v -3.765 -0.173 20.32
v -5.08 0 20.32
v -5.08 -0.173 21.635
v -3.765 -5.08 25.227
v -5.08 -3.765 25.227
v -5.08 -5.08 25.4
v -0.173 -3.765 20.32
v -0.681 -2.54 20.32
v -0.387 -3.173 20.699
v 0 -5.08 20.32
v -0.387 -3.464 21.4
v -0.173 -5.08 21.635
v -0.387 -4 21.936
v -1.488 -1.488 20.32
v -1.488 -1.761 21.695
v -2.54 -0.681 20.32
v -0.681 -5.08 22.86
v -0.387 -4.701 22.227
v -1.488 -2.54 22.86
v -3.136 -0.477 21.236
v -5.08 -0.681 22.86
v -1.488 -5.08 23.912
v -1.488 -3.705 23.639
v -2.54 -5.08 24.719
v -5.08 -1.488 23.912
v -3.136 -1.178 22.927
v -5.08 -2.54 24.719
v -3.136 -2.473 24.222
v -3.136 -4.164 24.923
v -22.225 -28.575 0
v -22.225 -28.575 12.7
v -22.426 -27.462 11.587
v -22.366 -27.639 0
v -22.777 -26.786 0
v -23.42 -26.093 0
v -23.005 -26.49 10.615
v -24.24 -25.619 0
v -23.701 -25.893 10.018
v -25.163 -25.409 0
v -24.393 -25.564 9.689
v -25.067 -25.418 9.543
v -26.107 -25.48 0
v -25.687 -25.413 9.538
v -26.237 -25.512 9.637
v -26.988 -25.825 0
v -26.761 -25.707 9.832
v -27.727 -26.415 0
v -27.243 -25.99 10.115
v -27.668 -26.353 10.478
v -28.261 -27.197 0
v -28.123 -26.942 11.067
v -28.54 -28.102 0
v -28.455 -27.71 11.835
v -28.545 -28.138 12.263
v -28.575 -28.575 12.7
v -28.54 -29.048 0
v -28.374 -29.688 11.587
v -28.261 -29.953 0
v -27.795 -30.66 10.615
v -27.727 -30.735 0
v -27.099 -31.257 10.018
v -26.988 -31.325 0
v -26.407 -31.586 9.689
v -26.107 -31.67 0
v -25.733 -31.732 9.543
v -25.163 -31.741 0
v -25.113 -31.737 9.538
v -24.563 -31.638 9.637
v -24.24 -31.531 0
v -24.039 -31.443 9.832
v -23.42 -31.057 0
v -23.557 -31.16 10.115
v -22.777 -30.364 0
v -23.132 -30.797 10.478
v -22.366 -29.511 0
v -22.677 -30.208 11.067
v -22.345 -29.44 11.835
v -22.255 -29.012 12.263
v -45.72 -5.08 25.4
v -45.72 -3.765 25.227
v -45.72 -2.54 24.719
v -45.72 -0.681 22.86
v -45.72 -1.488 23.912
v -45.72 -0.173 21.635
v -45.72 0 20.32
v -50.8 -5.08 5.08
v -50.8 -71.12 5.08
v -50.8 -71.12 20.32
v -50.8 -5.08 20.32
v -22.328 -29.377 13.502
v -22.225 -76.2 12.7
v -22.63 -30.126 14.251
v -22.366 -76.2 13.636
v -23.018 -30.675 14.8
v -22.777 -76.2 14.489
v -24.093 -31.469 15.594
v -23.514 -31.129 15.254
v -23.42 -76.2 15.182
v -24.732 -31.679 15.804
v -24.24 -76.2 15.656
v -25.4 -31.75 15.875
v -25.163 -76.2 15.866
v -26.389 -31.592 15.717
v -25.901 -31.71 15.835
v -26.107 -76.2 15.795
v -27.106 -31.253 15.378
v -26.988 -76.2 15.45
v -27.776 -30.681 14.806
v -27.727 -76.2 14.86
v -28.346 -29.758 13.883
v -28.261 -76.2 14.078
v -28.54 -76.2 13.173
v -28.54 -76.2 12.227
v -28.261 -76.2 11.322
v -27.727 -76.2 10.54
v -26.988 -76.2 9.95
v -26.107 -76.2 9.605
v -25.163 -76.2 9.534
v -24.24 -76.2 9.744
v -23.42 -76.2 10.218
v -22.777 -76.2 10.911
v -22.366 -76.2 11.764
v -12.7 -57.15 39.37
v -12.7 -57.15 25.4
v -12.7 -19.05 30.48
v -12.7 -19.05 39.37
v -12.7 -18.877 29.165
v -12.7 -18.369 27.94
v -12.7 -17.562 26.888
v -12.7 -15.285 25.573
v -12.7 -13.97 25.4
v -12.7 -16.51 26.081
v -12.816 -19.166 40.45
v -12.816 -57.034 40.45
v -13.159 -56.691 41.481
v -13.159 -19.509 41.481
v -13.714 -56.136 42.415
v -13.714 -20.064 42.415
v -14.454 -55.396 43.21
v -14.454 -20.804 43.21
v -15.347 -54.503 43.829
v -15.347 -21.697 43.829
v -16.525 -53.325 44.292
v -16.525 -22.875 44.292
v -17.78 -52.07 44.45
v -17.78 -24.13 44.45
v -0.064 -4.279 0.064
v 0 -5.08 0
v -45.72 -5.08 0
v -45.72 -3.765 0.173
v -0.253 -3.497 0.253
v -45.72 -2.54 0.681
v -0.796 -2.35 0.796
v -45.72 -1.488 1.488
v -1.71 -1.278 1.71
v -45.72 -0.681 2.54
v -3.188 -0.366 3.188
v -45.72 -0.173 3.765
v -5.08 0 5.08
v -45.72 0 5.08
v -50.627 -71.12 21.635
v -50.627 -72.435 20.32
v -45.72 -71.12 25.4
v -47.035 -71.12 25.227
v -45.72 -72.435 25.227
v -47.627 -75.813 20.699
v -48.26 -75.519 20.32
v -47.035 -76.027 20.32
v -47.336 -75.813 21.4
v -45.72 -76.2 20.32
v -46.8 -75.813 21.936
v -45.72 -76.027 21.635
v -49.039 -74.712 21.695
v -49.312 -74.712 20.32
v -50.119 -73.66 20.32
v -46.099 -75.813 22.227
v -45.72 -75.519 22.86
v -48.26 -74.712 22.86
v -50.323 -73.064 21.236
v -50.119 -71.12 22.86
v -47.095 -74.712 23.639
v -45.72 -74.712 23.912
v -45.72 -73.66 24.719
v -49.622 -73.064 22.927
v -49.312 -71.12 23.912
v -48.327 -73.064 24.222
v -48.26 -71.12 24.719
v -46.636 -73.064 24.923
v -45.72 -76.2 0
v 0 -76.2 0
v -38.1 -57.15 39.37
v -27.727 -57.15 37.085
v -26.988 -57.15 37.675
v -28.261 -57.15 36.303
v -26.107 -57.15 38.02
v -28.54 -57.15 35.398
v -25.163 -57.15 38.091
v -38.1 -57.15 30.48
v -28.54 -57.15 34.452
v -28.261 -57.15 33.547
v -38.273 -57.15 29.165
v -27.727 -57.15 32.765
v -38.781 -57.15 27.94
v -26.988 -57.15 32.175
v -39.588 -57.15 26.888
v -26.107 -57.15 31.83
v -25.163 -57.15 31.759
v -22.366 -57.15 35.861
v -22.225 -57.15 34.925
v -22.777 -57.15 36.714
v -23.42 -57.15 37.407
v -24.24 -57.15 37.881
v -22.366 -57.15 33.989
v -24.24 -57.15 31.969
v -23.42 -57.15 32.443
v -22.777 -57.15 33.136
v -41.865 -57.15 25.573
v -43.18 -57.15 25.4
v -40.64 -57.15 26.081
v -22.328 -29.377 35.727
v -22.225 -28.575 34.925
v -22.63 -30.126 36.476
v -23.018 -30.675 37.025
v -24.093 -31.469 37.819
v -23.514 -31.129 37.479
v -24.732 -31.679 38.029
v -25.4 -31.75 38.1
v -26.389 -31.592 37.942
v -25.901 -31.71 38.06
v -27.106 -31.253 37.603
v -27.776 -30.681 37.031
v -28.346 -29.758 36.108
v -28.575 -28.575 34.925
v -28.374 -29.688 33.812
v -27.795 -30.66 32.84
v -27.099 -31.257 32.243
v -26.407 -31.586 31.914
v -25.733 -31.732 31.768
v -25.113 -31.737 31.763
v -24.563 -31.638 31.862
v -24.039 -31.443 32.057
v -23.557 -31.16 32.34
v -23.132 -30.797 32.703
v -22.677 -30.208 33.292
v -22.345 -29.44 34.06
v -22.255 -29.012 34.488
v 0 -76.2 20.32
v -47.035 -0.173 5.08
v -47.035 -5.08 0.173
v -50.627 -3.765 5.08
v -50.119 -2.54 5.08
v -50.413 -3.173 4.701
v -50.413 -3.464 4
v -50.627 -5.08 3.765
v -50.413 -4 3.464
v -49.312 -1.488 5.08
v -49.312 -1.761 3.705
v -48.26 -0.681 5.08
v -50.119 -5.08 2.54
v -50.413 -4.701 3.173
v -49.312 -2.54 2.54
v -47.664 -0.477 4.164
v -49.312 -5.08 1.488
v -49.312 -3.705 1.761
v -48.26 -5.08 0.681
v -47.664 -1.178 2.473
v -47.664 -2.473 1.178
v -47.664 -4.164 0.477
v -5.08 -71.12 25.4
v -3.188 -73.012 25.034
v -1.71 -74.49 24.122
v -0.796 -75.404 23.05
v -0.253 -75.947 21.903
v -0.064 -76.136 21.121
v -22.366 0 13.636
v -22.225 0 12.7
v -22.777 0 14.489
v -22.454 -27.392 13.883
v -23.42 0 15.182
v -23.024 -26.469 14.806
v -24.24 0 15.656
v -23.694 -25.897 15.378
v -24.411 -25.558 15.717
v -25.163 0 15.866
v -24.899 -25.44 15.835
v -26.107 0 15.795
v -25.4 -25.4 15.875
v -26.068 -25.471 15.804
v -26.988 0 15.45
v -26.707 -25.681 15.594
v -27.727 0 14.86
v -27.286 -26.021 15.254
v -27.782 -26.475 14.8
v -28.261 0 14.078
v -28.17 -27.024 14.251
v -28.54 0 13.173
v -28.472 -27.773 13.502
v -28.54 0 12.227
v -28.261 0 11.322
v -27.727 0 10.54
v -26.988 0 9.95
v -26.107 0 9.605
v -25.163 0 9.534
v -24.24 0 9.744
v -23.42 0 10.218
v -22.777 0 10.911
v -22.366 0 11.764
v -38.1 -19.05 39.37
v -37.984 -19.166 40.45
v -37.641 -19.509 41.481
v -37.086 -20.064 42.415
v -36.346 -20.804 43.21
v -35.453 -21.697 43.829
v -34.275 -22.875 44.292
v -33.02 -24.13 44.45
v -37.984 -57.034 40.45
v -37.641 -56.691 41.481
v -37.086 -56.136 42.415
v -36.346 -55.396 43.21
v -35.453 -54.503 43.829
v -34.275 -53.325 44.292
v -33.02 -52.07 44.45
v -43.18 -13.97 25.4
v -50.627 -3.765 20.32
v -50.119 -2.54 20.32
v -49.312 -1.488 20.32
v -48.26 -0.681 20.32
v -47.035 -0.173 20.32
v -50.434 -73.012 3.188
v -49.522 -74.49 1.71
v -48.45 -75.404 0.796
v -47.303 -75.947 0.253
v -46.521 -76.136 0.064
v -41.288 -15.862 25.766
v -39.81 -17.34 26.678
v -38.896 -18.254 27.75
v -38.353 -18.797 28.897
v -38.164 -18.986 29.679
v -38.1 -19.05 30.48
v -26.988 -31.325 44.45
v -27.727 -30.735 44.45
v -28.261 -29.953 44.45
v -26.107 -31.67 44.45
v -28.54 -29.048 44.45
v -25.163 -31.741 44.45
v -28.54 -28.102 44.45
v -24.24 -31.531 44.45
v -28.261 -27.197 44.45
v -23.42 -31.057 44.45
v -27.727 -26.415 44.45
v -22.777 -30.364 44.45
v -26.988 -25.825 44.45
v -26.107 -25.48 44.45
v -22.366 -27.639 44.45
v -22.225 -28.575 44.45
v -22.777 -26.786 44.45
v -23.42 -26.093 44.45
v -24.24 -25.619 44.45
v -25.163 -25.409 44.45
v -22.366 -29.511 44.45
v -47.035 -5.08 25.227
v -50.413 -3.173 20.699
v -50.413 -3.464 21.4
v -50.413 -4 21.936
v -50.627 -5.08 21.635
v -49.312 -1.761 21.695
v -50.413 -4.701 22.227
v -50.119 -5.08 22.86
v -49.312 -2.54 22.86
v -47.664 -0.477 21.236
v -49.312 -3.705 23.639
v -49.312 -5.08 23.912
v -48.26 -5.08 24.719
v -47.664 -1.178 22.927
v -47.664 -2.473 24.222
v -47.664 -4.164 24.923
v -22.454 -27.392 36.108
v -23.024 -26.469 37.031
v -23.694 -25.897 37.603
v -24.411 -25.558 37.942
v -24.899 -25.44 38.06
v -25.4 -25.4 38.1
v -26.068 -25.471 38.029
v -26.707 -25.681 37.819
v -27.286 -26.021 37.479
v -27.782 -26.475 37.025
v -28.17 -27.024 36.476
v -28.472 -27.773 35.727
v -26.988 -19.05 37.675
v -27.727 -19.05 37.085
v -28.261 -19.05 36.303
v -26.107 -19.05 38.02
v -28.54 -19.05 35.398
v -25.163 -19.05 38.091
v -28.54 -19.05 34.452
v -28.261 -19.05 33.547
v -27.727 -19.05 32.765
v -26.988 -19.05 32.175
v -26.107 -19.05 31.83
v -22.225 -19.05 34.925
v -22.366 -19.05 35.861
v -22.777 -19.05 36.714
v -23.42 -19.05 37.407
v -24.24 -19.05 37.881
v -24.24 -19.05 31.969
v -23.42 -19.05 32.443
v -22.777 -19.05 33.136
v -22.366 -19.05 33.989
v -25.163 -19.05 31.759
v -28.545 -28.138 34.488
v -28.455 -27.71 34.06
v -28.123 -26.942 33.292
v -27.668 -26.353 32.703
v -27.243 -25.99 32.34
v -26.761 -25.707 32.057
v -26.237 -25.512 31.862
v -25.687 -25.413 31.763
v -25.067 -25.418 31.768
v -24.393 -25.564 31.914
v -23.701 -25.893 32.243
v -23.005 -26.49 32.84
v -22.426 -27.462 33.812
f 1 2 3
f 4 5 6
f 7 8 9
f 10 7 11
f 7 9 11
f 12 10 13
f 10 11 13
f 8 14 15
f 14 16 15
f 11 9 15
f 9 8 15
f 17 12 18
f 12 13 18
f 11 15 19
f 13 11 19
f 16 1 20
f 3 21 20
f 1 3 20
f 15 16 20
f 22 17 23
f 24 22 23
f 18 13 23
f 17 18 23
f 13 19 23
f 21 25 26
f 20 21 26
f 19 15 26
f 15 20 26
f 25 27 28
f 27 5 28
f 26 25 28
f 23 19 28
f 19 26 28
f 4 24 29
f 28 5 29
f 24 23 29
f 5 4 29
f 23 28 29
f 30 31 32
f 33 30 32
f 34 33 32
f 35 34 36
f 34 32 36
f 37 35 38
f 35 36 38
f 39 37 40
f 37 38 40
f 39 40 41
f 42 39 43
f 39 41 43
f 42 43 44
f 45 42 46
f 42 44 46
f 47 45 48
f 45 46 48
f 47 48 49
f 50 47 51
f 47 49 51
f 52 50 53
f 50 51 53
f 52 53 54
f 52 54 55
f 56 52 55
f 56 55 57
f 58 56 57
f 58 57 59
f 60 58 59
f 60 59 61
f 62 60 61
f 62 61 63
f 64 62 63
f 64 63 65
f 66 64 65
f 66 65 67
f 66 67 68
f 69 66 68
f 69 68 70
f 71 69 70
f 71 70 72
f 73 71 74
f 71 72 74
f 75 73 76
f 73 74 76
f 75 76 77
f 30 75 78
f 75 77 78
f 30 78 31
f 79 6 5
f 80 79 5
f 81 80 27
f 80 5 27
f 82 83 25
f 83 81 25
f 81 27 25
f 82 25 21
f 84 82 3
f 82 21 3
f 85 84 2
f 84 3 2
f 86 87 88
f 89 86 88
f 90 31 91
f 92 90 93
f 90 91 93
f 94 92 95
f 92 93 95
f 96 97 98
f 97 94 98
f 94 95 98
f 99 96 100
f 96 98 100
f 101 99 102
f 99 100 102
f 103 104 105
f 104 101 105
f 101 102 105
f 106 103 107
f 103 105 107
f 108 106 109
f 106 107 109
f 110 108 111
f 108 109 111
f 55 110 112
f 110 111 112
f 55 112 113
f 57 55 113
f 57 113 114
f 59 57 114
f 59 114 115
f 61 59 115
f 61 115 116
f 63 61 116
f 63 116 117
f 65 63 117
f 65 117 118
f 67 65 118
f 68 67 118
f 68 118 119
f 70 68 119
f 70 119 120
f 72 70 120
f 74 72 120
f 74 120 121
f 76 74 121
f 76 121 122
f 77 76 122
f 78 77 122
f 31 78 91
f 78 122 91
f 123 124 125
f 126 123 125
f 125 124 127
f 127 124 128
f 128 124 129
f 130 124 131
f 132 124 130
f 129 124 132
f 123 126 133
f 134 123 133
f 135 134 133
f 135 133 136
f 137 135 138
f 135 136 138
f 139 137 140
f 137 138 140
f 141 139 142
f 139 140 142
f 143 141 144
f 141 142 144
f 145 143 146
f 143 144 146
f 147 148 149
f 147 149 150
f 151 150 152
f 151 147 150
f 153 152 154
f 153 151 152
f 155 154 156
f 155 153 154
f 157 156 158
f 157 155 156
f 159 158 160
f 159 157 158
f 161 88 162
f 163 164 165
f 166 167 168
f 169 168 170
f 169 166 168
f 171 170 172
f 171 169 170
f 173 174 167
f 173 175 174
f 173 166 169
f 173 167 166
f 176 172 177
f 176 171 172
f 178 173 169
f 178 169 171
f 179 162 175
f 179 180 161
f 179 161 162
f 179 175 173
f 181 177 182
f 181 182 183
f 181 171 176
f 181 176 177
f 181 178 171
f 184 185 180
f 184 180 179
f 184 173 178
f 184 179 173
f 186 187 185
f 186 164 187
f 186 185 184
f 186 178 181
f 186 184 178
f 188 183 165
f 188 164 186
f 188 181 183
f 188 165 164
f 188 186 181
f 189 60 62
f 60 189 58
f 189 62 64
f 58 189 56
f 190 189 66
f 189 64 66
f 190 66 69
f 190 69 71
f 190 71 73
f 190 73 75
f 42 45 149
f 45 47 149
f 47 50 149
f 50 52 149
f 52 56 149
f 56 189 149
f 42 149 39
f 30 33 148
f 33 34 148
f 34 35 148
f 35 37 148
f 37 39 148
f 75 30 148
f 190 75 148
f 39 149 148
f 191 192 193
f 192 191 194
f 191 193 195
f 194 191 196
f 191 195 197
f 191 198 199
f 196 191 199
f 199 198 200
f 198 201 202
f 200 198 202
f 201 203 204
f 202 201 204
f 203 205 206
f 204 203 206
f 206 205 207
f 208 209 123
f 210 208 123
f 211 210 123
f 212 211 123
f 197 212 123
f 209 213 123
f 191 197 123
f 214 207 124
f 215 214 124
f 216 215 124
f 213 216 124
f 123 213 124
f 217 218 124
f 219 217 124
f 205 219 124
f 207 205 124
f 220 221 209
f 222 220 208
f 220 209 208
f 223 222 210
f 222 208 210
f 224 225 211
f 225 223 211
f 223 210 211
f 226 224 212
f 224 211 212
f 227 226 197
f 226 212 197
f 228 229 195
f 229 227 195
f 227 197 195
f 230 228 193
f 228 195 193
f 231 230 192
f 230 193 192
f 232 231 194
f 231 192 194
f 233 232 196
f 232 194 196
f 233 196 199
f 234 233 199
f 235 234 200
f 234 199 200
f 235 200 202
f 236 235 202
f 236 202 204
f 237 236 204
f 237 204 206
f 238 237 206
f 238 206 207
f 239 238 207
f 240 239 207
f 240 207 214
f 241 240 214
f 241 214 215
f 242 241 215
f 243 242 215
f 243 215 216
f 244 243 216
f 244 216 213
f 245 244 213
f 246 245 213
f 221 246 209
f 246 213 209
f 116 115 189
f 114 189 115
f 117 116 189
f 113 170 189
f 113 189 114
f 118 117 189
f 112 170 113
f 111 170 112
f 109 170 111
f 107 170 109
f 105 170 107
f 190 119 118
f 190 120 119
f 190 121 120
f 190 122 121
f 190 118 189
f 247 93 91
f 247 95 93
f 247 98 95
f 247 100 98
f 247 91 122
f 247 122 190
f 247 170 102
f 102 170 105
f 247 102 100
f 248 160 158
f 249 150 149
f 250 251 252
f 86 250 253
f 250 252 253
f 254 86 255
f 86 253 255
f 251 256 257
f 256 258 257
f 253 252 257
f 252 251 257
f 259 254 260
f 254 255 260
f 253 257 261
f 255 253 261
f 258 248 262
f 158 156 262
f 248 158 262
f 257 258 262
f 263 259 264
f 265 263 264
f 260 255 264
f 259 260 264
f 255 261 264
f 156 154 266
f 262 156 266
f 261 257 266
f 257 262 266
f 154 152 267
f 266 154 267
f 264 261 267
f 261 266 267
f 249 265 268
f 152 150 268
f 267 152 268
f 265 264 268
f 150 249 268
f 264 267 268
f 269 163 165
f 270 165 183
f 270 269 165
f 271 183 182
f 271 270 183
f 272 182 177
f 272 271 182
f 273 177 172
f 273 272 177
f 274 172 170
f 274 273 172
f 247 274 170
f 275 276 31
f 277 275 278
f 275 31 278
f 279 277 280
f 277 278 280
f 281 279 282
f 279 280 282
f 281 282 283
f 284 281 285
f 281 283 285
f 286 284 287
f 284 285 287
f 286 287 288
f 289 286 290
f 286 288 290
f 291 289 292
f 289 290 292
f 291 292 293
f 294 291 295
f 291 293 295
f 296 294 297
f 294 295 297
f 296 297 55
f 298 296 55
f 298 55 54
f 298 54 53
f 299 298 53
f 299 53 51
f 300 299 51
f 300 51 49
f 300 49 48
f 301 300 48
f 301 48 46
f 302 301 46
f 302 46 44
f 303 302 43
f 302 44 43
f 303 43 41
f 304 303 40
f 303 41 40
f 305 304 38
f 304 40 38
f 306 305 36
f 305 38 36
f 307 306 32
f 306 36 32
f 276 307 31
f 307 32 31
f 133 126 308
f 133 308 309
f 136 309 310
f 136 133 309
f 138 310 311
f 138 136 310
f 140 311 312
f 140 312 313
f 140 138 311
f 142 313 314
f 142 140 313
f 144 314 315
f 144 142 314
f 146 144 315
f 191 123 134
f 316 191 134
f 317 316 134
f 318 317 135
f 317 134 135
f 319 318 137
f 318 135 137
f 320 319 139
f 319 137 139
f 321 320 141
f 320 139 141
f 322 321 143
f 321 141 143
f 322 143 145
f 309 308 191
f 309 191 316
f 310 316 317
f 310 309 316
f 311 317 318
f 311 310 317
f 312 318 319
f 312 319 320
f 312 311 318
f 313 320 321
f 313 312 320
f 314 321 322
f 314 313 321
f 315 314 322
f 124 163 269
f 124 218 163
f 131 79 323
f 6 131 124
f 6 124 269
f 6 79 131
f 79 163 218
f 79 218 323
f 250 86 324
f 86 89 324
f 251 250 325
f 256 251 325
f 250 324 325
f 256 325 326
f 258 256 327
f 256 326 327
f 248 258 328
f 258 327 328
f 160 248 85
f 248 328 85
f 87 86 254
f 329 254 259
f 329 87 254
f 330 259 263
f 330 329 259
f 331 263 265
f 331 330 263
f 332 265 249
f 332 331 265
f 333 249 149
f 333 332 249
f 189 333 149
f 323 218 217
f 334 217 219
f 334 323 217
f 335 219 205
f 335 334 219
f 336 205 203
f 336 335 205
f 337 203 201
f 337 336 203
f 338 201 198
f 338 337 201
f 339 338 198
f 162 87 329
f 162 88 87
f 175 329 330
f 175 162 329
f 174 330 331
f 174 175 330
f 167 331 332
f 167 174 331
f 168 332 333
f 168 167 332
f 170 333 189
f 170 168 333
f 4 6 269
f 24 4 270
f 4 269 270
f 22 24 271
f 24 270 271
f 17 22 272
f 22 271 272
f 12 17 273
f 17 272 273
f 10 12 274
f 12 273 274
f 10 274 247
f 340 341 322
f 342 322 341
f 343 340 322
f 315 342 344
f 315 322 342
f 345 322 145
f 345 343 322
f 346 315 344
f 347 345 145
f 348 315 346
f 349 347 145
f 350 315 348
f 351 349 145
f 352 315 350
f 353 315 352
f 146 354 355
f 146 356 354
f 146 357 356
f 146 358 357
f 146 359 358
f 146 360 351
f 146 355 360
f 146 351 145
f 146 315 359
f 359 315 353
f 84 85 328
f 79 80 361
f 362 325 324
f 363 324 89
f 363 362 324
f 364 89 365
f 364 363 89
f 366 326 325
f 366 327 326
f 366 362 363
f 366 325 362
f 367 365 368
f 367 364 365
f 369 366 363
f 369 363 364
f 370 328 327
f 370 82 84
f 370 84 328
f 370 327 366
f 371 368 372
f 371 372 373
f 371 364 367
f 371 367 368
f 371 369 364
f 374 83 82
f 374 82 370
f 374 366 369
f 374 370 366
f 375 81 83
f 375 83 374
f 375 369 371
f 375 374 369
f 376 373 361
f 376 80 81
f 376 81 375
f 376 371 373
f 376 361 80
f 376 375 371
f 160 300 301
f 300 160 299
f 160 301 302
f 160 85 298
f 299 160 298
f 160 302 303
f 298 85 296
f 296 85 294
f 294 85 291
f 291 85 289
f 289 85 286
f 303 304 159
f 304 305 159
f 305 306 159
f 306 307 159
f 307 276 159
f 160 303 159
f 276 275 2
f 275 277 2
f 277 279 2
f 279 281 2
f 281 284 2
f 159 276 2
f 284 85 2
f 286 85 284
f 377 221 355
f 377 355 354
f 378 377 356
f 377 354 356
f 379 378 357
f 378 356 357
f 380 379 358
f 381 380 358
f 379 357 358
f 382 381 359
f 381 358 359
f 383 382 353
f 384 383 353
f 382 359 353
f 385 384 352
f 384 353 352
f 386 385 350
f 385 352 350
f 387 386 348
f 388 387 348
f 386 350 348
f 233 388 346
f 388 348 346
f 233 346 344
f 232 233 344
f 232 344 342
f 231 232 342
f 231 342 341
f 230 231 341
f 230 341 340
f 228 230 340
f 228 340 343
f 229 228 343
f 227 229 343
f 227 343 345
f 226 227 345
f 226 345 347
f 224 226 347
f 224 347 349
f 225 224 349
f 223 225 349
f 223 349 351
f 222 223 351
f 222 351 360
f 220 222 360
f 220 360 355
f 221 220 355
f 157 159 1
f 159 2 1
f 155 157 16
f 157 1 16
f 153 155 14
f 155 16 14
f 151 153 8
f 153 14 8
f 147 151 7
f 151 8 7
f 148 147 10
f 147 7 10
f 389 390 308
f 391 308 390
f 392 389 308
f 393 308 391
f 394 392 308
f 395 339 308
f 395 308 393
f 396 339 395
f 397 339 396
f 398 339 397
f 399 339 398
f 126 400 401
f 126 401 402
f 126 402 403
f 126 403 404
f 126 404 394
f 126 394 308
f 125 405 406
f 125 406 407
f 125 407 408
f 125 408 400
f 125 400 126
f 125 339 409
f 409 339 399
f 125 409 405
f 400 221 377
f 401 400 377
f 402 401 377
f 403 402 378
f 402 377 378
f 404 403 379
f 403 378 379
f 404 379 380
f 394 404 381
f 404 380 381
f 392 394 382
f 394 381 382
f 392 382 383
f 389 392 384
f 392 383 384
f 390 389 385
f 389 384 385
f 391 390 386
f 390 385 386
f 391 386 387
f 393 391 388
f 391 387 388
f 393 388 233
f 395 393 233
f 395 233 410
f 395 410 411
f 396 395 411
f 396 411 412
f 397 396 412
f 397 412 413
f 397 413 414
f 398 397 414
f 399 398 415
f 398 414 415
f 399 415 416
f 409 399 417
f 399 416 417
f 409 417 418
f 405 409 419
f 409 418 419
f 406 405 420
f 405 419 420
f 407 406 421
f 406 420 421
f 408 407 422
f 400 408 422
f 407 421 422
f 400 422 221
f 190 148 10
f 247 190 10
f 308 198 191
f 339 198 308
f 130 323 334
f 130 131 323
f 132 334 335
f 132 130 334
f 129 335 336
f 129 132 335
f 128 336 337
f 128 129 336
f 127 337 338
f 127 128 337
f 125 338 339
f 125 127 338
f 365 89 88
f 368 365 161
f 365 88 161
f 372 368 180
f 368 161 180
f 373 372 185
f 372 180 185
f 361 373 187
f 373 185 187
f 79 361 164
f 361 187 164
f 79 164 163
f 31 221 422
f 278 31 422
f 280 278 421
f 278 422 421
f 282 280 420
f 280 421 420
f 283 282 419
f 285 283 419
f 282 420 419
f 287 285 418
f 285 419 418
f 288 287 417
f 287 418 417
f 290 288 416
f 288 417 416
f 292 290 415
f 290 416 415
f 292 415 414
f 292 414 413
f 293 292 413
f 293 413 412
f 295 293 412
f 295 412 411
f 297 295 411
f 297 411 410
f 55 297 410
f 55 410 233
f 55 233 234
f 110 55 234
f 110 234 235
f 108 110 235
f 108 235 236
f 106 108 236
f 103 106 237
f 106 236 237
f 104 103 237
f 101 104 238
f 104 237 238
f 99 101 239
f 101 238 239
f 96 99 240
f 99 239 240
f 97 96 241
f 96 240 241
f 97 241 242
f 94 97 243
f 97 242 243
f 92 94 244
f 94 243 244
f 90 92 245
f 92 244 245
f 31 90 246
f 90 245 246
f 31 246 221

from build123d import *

# Parameters (mm, degrees)
F0_W     = 50.8
F0_H     = 25.4
F1_DEPTH = 76.2
F2_W     = 25.4
F2_H     = 38.1
F3_DEPTH = 19.05
F4_R     = 3.175
F5_DEPTH = 44.45
F6_R     = 3.175
F7_DEPTH = 76.2
F8_R     = 3.175
F9_DEPTH = 38.1
F10_R    = 5.08


with BuildPart() as f1:
    # F0 (on Front) → F1 (new body)
    with BuildSketch(Plane.XZ):
        with Locations((-25.4, 12.7)):
            Rectangle(F0_W, F0_H)
    extrude(amount=F1_DEPTH)

    # F2 (on face) → F3 (join)
    with BuildSketch(Plane.XY.offset(25.4)):
        with Locations((-25.4, -38.1)):
            Rectangle(F2_W, F2_H)
    extrude(amount=F3_DEPTH)

    # F4 (on face) → F5 (cut)
    with BuildSketch(Plane.XY.offset(44.45)):
        with Locations((-25.4, -28.575)):
            Circle(F4_R)
    extrude(amount=-F5_DEPTH, mode=Mode.SUBTRACT)

    # F6 (on face) → F7 (cut)
    with BuildSketch(Plane.XZ.offset(76.2)):
        with Locations((-25.4, 12.7)):
            Circle(F6_R)
    extrude(amount=-F7_DEPTH, mode=Mode.SUBTRACT)

    # F8 (on face) → F9 (cut)
    with BuildSketch(Plane.XZ.offset(57.15)):
        with Locations((-25.4, 34.925)):
            Circle(F8_R)
    extrude(amount=-F9_DEPTH, mode=Mode.SUBTRACT)

    # F10
    f10_edges = [f1.edges().sort_by_distance(p)[0] for p in [
        (-38.1, -38.1, 44.45),
        (-25.4, -19.05, 44.45),
        (-12.7, -38.1, 44.45),
        (-25.4, -57.15, 44.45),
        (-25.4, -19.05, 25.4),
        (-38.1, -38.1, 25.4),
        (-25.4, 0, 25.4),
        (0, 0, 12.7),
        (-25.4, 0, 0),
        (-50.8, 0, 12.7),
        (-50.8, -38.1, 25.4),
        (-50.8, -38.1, 0),
        (-50.8, -76.2, 12.7),
        (-25.4, -76.2, 25.4),
        (0, -38.1, 25.4),
    ]]
    fillet(f10_edges, radius=F10_R)


solid = f1.part
